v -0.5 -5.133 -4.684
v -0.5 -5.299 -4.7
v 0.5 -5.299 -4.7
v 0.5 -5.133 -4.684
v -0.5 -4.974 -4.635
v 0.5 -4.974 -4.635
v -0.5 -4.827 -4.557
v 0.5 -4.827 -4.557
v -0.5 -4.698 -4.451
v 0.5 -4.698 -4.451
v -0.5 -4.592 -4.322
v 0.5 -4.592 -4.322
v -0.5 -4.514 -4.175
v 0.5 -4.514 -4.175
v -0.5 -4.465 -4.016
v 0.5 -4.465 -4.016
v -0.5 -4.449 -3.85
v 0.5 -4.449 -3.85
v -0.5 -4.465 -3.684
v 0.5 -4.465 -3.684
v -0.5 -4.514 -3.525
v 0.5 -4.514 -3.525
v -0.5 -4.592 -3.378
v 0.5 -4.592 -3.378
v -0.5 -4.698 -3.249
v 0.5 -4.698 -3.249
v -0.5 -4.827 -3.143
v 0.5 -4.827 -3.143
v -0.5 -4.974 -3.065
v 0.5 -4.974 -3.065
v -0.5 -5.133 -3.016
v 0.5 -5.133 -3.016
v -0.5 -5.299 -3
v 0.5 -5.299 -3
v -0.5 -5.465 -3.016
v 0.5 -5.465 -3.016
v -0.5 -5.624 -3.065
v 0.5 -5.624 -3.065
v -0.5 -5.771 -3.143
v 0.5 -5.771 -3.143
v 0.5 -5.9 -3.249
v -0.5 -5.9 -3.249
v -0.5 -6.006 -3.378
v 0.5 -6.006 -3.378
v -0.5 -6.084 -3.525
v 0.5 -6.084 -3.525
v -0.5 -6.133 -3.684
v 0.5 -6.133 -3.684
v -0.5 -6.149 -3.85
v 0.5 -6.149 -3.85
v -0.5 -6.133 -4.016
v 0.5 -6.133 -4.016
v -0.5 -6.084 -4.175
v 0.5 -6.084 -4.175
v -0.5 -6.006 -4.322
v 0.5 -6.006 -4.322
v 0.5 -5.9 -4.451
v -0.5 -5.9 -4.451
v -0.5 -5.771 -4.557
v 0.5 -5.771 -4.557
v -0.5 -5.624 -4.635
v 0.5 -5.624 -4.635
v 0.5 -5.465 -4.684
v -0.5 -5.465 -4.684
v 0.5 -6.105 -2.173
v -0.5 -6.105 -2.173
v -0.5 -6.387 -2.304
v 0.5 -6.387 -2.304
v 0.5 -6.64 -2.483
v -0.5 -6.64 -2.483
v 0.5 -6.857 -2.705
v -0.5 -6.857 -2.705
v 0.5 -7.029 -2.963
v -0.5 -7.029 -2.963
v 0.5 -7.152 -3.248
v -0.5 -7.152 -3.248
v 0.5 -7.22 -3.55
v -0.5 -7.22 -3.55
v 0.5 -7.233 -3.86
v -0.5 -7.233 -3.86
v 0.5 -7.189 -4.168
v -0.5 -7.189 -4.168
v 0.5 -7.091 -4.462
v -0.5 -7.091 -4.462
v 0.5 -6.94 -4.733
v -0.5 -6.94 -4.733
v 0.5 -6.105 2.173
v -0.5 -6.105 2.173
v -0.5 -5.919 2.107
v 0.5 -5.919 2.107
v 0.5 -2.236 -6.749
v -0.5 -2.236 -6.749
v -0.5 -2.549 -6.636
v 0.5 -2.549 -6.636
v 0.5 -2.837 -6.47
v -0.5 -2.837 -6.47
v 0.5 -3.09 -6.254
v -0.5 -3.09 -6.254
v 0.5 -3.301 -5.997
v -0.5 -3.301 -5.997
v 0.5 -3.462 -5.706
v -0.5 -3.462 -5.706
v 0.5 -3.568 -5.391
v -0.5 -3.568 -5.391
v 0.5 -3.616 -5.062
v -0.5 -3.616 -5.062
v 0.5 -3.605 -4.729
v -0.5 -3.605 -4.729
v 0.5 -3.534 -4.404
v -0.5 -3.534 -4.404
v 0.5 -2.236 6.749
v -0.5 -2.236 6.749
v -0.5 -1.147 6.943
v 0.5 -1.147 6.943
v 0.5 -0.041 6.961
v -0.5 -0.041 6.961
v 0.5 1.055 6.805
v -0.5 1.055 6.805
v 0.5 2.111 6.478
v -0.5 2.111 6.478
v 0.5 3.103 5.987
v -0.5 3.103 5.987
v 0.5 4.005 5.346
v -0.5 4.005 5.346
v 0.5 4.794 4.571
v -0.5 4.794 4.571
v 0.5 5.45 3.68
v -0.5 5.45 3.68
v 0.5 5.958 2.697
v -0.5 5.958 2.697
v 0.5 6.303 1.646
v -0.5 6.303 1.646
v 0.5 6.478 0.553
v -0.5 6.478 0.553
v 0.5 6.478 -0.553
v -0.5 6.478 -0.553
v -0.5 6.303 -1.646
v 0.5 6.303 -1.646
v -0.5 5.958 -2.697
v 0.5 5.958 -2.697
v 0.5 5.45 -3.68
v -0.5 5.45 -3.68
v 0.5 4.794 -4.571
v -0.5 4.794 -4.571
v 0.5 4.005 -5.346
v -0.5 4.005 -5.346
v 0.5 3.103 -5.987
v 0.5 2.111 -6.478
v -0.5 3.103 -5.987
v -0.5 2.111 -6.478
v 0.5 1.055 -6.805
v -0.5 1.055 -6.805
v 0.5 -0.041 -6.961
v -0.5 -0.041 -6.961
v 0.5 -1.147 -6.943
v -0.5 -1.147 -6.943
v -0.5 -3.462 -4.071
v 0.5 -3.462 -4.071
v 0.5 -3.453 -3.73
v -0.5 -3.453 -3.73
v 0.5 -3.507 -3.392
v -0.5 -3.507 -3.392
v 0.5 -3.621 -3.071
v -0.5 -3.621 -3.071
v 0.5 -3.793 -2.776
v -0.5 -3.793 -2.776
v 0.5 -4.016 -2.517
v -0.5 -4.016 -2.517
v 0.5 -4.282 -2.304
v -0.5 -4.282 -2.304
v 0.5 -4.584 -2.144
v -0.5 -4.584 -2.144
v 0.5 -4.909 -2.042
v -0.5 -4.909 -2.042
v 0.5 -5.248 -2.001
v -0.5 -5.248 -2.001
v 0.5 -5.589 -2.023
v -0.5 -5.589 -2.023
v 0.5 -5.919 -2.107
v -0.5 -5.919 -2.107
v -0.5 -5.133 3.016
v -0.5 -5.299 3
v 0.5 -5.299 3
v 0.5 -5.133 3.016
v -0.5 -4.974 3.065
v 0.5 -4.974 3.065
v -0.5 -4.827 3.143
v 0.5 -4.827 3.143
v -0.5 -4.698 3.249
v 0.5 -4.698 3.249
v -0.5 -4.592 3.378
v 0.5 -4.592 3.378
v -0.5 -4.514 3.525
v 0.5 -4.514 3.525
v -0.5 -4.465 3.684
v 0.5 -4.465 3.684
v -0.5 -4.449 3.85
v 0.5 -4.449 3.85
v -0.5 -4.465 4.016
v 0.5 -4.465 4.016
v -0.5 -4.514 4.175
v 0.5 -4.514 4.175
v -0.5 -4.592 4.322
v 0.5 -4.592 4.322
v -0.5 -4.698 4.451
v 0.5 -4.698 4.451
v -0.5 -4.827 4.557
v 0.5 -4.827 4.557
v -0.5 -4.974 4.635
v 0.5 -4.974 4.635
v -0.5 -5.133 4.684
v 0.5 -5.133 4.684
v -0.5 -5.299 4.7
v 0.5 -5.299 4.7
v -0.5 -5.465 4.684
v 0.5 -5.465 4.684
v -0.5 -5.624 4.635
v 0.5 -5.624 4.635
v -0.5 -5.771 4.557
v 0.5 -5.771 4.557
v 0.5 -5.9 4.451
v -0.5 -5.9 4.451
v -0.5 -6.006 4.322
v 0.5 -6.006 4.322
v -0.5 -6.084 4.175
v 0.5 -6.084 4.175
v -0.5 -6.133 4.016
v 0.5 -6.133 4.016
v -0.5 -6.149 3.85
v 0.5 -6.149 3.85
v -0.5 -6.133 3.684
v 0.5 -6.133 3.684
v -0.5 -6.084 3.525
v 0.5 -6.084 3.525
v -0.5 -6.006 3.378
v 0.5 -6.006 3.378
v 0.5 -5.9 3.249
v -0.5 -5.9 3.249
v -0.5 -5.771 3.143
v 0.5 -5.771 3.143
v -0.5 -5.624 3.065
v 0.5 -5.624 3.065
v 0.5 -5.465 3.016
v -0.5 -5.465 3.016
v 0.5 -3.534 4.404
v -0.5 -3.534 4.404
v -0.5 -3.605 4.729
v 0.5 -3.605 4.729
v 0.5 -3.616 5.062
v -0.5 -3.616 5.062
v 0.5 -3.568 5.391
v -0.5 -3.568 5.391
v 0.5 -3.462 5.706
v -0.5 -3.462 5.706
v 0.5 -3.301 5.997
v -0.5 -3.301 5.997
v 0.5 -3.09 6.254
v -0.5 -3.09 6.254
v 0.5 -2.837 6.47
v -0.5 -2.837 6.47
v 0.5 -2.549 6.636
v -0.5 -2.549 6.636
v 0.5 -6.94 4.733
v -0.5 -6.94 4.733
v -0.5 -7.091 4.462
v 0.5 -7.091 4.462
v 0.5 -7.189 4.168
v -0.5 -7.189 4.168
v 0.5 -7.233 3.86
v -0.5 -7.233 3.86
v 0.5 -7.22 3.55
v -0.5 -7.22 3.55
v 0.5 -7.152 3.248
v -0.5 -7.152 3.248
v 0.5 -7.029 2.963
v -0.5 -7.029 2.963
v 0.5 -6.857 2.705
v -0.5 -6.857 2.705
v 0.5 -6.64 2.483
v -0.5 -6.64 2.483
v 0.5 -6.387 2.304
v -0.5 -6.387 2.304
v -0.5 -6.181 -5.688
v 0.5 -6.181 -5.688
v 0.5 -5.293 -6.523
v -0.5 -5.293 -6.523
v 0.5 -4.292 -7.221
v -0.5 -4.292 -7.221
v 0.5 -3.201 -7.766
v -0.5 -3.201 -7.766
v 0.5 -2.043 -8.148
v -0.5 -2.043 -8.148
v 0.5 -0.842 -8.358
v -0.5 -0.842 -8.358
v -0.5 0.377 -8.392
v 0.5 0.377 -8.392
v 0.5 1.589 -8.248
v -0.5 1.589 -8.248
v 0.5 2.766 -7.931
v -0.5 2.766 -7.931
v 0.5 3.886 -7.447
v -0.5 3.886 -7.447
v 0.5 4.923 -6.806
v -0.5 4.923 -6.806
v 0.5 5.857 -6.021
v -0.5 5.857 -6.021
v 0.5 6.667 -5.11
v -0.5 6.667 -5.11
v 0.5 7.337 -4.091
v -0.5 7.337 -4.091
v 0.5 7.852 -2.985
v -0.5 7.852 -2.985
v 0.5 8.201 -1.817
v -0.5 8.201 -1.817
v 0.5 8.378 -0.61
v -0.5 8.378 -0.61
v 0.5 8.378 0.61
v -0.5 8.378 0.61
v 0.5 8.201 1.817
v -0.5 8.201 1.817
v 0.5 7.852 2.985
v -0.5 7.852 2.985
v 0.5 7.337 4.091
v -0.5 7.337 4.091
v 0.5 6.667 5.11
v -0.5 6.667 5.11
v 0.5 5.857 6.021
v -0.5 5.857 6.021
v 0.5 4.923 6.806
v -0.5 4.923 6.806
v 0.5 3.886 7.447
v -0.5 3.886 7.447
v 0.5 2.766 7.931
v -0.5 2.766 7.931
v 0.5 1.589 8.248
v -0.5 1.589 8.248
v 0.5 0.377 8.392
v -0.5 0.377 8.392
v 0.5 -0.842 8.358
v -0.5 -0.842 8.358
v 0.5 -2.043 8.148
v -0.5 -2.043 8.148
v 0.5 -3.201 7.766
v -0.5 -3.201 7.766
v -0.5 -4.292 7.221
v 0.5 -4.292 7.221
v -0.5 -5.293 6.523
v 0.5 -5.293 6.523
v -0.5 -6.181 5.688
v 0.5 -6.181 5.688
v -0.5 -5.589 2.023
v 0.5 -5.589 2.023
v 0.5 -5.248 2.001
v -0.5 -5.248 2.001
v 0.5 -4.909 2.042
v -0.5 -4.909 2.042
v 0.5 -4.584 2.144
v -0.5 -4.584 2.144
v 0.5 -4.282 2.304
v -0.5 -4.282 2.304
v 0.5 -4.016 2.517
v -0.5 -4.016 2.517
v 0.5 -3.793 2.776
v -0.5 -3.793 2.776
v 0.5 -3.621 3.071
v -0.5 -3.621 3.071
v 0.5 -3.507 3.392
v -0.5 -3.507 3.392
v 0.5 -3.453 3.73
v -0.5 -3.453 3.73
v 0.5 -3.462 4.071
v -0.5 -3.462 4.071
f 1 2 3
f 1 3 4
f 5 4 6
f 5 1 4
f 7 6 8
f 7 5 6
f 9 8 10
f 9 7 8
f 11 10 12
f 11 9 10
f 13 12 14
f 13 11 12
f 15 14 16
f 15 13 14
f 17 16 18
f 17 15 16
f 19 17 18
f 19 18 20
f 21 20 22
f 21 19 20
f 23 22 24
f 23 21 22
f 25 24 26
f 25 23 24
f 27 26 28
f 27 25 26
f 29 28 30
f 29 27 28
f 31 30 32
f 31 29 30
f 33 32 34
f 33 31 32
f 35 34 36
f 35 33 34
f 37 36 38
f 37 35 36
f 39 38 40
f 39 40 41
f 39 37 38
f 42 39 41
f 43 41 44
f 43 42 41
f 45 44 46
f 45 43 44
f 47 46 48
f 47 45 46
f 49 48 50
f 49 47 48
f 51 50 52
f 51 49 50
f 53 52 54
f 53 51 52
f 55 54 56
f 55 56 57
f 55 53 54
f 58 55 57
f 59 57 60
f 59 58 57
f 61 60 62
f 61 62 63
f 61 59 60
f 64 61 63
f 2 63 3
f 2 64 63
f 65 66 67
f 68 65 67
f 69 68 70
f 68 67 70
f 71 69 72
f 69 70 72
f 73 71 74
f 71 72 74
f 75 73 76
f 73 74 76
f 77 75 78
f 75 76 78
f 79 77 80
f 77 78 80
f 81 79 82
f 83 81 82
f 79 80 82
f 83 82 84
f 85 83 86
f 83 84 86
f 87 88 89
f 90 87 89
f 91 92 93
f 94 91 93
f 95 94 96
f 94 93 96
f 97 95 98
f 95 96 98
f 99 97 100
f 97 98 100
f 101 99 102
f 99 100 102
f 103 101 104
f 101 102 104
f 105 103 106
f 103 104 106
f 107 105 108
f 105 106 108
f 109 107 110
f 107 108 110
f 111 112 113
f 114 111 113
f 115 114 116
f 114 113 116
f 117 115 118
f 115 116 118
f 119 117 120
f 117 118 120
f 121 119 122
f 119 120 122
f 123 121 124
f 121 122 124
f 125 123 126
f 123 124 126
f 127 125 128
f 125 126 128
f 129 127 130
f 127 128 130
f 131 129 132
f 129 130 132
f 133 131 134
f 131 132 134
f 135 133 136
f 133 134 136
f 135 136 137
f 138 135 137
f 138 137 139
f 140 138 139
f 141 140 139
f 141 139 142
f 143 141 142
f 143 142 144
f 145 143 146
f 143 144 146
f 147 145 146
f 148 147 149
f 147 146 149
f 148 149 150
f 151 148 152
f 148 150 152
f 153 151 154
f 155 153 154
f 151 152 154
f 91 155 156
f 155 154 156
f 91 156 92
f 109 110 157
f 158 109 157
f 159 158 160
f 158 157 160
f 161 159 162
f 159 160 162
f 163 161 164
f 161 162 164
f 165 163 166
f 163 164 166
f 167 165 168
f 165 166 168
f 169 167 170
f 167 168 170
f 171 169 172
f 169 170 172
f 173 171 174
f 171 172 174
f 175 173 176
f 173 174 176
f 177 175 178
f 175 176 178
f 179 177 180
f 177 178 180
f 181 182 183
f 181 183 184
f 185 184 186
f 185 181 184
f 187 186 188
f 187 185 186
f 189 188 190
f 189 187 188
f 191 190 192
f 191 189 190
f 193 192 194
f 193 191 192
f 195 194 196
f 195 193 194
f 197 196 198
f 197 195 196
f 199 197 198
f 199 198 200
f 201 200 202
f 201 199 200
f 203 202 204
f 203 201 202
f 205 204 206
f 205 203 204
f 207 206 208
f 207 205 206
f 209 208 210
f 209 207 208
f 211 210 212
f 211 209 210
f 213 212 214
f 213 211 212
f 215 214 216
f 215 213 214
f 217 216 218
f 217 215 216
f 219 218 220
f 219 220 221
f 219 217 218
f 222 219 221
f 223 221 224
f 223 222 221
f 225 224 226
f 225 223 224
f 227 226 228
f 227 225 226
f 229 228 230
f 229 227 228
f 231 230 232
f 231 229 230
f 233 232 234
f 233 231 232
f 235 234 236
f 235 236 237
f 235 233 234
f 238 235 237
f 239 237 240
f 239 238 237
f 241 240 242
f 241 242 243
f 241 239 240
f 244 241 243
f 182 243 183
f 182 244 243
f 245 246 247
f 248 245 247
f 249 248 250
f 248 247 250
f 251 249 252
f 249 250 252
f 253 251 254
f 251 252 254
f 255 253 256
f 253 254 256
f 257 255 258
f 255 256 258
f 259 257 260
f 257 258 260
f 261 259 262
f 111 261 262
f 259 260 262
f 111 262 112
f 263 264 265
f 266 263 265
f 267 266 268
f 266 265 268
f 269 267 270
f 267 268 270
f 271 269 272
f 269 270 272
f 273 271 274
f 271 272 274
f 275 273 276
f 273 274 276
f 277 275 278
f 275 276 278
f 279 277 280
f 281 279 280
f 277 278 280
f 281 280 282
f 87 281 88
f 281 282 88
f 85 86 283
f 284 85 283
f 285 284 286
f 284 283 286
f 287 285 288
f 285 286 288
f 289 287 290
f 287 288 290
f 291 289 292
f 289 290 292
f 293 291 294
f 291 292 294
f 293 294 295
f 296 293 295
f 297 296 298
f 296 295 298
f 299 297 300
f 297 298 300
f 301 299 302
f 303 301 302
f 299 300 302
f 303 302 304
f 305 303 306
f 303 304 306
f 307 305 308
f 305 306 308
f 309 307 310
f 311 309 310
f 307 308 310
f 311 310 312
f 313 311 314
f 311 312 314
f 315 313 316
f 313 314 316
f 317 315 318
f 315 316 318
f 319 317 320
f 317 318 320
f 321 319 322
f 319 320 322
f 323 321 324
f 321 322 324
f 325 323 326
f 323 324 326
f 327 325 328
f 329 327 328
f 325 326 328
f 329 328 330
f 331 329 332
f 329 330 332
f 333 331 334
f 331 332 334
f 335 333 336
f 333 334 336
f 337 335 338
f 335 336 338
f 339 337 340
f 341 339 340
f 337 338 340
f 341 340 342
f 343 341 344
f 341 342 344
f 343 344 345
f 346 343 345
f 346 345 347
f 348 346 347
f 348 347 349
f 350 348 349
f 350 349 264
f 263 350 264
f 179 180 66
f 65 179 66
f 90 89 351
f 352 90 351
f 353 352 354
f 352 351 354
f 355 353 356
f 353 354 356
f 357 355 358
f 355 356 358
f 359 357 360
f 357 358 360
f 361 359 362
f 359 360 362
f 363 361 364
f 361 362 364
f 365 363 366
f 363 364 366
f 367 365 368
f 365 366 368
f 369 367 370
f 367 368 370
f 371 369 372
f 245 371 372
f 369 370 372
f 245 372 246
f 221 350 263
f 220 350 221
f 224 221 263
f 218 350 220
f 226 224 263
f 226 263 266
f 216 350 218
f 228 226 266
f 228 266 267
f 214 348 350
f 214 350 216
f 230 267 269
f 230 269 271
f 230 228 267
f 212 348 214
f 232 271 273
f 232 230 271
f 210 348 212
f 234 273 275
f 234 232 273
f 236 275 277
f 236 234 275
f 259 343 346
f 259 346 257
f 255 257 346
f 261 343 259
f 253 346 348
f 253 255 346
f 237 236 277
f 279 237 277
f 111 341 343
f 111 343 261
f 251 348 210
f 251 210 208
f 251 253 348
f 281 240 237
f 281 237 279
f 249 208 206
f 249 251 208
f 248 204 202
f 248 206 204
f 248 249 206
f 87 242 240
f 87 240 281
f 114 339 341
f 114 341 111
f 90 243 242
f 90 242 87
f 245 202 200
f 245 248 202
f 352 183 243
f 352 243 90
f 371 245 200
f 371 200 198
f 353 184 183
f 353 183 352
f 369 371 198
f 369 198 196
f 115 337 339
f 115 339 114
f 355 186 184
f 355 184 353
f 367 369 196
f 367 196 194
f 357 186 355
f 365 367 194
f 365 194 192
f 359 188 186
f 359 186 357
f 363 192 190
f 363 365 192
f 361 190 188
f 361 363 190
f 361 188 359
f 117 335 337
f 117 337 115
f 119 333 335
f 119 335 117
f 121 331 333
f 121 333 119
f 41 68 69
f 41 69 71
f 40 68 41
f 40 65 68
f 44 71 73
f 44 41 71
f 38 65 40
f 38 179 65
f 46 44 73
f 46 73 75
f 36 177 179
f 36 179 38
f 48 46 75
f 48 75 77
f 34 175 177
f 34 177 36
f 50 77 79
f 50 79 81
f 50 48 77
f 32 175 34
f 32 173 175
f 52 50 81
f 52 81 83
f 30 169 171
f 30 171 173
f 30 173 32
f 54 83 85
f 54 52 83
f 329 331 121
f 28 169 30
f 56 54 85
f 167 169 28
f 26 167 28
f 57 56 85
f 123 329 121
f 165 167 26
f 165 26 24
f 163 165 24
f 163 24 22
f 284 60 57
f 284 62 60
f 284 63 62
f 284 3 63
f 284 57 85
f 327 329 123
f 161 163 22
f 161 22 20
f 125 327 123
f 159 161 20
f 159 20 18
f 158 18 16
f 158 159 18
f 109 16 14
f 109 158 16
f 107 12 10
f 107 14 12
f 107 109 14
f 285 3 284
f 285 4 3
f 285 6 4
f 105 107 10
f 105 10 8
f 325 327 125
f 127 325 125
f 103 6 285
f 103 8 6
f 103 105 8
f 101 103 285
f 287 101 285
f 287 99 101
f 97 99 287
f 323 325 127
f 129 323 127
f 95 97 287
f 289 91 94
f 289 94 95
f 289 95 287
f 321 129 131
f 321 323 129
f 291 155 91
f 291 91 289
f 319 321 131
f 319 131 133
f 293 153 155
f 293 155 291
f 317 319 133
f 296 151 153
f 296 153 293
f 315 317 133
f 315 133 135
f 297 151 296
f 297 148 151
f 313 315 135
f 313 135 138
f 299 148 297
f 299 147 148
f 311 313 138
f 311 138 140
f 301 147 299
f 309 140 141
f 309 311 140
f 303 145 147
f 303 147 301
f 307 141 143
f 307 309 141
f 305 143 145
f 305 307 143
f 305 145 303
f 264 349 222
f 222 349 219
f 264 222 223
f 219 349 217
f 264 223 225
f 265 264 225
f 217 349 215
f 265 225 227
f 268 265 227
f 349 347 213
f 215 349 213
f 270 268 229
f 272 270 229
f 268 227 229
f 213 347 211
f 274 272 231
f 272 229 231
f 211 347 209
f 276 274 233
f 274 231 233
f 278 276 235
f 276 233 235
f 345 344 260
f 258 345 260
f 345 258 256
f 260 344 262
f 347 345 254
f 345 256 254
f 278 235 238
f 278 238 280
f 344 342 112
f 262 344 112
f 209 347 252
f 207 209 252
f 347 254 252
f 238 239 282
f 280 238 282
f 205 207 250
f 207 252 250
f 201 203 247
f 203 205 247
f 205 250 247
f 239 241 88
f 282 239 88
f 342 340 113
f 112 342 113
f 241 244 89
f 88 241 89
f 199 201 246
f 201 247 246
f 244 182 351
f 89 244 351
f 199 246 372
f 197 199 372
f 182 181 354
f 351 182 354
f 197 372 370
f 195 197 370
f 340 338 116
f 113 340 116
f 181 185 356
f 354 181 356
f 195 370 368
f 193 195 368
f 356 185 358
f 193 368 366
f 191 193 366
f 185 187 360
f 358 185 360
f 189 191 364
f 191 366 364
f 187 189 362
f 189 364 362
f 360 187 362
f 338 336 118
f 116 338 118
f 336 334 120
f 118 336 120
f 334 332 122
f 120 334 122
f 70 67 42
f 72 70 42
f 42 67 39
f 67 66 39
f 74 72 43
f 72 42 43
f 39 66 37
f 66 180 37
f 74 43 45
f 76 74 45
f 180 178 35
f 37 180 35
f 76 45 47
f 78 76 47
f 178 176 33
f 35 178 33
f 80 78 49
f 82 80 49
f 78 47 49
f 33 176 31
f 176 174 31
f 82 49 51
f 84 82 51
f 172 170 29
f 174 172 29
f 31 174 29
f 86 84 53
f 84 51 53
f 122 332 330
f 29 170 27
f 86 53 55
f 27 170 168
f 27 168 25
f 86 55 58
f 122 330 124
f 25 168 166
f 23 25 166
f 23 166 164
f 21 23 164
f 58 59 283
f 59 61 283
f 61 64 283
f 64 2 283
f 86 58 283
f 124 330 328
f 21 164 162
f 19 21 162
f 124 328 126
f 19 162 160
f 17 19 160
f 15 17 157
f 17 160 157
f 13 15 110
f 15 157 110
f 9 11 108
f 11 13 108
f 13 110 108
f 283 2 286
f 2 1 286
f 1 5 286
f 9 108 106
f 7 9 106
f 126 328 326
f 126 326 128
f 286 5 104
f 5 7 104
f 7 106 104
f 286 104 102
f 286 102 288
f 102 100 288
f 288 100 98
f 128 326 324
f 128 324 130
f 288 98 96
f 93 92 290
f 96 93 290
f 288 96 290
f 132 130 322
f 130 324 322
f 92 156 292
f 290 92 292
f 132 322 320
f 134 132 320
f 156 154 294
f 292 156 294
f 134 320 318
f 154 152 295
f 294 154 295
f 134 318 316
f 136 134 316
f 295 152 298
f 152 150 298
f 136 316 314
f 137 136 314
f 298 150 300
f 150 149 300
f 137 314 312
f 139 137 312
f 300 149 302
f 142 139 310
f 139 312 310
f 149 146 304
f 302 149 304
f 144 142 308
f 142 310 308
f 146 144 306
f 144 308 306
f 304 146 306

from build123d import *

# Parameters (mm, degrees)
BOSS_EXTRUDE1_DEPTH      = 0.5
BOSS_EXTRUDE1_DEPTH_BACK = 0.5
SKETCH1_R                = 0.85


with BuildPart() as part:
    # Sketch1 → Boss-Extrude1 (new, two sides: drawn at the far end of the back side and taken through both)
    with BuildSketch(Plane(origin=(0, 0, 0), x_dir=(0, 0, -1), z_dir=(1, 0, 0)).offset(-BOSS_EXTRUDE1_DEPTH_BACK)):
        with BuildLine():
            Line((-2.173337586, -6.105456882), (-2.107128968, -5.919460069))
            ThreePointArc((-2.107128968, -5.919460069), (-2.517494945, -4.015728705), (-4.40445692, -3.534098298))
            ThreePointArc((-4.40445692, -3.534098298), (-5.854874371, -3.387705714), (-6.748960786, -2.23629308))
            ThreePointArc((-6.748960786, -2.23629308), (0, 6.5), (6.748960786, -2.23629308))
            ThreePointArc((6.748960786, -2.23629308), (5.854874409, -3.387705693), (4.404457002, -3.534098324))
            ThreePointArc((4.404457002, -3.534098324), (2.517494975, -4.015728674), (2.107128968, -5.919460069))
            Line((2.107128968, -5.919460069), (2.173337586, -6.105456882))
            ThreePointArc((2.173337586, -6.105456882), (3.247964263, -7.151631133), (4.732703867, -6.939849718))
            ThreePointArc((4.732703867, -6.939849718), (0, 8.4), (-4.732703867, -6.939849718))
            ThreePointArc((-4.732703867, -6.939849718), (-3.247964263, -7.151631133), (-2.173337586, -6.105456882))
        make_face()
        with Locations((3.85, -5.29905652)):
            Circle(SKETCH1_R, mode=Mode.SUBTRACT)
        with Locations((-3.85, -5.29905652)):
            Circle(SKETCH1_R, mode=Mode.SUBTRACT)
    extrude(amount=BOSS_EXTRUDE1_DEPTH + BOSS_EXTRUDE1_DEPTH_BACK)


solid = part.part
